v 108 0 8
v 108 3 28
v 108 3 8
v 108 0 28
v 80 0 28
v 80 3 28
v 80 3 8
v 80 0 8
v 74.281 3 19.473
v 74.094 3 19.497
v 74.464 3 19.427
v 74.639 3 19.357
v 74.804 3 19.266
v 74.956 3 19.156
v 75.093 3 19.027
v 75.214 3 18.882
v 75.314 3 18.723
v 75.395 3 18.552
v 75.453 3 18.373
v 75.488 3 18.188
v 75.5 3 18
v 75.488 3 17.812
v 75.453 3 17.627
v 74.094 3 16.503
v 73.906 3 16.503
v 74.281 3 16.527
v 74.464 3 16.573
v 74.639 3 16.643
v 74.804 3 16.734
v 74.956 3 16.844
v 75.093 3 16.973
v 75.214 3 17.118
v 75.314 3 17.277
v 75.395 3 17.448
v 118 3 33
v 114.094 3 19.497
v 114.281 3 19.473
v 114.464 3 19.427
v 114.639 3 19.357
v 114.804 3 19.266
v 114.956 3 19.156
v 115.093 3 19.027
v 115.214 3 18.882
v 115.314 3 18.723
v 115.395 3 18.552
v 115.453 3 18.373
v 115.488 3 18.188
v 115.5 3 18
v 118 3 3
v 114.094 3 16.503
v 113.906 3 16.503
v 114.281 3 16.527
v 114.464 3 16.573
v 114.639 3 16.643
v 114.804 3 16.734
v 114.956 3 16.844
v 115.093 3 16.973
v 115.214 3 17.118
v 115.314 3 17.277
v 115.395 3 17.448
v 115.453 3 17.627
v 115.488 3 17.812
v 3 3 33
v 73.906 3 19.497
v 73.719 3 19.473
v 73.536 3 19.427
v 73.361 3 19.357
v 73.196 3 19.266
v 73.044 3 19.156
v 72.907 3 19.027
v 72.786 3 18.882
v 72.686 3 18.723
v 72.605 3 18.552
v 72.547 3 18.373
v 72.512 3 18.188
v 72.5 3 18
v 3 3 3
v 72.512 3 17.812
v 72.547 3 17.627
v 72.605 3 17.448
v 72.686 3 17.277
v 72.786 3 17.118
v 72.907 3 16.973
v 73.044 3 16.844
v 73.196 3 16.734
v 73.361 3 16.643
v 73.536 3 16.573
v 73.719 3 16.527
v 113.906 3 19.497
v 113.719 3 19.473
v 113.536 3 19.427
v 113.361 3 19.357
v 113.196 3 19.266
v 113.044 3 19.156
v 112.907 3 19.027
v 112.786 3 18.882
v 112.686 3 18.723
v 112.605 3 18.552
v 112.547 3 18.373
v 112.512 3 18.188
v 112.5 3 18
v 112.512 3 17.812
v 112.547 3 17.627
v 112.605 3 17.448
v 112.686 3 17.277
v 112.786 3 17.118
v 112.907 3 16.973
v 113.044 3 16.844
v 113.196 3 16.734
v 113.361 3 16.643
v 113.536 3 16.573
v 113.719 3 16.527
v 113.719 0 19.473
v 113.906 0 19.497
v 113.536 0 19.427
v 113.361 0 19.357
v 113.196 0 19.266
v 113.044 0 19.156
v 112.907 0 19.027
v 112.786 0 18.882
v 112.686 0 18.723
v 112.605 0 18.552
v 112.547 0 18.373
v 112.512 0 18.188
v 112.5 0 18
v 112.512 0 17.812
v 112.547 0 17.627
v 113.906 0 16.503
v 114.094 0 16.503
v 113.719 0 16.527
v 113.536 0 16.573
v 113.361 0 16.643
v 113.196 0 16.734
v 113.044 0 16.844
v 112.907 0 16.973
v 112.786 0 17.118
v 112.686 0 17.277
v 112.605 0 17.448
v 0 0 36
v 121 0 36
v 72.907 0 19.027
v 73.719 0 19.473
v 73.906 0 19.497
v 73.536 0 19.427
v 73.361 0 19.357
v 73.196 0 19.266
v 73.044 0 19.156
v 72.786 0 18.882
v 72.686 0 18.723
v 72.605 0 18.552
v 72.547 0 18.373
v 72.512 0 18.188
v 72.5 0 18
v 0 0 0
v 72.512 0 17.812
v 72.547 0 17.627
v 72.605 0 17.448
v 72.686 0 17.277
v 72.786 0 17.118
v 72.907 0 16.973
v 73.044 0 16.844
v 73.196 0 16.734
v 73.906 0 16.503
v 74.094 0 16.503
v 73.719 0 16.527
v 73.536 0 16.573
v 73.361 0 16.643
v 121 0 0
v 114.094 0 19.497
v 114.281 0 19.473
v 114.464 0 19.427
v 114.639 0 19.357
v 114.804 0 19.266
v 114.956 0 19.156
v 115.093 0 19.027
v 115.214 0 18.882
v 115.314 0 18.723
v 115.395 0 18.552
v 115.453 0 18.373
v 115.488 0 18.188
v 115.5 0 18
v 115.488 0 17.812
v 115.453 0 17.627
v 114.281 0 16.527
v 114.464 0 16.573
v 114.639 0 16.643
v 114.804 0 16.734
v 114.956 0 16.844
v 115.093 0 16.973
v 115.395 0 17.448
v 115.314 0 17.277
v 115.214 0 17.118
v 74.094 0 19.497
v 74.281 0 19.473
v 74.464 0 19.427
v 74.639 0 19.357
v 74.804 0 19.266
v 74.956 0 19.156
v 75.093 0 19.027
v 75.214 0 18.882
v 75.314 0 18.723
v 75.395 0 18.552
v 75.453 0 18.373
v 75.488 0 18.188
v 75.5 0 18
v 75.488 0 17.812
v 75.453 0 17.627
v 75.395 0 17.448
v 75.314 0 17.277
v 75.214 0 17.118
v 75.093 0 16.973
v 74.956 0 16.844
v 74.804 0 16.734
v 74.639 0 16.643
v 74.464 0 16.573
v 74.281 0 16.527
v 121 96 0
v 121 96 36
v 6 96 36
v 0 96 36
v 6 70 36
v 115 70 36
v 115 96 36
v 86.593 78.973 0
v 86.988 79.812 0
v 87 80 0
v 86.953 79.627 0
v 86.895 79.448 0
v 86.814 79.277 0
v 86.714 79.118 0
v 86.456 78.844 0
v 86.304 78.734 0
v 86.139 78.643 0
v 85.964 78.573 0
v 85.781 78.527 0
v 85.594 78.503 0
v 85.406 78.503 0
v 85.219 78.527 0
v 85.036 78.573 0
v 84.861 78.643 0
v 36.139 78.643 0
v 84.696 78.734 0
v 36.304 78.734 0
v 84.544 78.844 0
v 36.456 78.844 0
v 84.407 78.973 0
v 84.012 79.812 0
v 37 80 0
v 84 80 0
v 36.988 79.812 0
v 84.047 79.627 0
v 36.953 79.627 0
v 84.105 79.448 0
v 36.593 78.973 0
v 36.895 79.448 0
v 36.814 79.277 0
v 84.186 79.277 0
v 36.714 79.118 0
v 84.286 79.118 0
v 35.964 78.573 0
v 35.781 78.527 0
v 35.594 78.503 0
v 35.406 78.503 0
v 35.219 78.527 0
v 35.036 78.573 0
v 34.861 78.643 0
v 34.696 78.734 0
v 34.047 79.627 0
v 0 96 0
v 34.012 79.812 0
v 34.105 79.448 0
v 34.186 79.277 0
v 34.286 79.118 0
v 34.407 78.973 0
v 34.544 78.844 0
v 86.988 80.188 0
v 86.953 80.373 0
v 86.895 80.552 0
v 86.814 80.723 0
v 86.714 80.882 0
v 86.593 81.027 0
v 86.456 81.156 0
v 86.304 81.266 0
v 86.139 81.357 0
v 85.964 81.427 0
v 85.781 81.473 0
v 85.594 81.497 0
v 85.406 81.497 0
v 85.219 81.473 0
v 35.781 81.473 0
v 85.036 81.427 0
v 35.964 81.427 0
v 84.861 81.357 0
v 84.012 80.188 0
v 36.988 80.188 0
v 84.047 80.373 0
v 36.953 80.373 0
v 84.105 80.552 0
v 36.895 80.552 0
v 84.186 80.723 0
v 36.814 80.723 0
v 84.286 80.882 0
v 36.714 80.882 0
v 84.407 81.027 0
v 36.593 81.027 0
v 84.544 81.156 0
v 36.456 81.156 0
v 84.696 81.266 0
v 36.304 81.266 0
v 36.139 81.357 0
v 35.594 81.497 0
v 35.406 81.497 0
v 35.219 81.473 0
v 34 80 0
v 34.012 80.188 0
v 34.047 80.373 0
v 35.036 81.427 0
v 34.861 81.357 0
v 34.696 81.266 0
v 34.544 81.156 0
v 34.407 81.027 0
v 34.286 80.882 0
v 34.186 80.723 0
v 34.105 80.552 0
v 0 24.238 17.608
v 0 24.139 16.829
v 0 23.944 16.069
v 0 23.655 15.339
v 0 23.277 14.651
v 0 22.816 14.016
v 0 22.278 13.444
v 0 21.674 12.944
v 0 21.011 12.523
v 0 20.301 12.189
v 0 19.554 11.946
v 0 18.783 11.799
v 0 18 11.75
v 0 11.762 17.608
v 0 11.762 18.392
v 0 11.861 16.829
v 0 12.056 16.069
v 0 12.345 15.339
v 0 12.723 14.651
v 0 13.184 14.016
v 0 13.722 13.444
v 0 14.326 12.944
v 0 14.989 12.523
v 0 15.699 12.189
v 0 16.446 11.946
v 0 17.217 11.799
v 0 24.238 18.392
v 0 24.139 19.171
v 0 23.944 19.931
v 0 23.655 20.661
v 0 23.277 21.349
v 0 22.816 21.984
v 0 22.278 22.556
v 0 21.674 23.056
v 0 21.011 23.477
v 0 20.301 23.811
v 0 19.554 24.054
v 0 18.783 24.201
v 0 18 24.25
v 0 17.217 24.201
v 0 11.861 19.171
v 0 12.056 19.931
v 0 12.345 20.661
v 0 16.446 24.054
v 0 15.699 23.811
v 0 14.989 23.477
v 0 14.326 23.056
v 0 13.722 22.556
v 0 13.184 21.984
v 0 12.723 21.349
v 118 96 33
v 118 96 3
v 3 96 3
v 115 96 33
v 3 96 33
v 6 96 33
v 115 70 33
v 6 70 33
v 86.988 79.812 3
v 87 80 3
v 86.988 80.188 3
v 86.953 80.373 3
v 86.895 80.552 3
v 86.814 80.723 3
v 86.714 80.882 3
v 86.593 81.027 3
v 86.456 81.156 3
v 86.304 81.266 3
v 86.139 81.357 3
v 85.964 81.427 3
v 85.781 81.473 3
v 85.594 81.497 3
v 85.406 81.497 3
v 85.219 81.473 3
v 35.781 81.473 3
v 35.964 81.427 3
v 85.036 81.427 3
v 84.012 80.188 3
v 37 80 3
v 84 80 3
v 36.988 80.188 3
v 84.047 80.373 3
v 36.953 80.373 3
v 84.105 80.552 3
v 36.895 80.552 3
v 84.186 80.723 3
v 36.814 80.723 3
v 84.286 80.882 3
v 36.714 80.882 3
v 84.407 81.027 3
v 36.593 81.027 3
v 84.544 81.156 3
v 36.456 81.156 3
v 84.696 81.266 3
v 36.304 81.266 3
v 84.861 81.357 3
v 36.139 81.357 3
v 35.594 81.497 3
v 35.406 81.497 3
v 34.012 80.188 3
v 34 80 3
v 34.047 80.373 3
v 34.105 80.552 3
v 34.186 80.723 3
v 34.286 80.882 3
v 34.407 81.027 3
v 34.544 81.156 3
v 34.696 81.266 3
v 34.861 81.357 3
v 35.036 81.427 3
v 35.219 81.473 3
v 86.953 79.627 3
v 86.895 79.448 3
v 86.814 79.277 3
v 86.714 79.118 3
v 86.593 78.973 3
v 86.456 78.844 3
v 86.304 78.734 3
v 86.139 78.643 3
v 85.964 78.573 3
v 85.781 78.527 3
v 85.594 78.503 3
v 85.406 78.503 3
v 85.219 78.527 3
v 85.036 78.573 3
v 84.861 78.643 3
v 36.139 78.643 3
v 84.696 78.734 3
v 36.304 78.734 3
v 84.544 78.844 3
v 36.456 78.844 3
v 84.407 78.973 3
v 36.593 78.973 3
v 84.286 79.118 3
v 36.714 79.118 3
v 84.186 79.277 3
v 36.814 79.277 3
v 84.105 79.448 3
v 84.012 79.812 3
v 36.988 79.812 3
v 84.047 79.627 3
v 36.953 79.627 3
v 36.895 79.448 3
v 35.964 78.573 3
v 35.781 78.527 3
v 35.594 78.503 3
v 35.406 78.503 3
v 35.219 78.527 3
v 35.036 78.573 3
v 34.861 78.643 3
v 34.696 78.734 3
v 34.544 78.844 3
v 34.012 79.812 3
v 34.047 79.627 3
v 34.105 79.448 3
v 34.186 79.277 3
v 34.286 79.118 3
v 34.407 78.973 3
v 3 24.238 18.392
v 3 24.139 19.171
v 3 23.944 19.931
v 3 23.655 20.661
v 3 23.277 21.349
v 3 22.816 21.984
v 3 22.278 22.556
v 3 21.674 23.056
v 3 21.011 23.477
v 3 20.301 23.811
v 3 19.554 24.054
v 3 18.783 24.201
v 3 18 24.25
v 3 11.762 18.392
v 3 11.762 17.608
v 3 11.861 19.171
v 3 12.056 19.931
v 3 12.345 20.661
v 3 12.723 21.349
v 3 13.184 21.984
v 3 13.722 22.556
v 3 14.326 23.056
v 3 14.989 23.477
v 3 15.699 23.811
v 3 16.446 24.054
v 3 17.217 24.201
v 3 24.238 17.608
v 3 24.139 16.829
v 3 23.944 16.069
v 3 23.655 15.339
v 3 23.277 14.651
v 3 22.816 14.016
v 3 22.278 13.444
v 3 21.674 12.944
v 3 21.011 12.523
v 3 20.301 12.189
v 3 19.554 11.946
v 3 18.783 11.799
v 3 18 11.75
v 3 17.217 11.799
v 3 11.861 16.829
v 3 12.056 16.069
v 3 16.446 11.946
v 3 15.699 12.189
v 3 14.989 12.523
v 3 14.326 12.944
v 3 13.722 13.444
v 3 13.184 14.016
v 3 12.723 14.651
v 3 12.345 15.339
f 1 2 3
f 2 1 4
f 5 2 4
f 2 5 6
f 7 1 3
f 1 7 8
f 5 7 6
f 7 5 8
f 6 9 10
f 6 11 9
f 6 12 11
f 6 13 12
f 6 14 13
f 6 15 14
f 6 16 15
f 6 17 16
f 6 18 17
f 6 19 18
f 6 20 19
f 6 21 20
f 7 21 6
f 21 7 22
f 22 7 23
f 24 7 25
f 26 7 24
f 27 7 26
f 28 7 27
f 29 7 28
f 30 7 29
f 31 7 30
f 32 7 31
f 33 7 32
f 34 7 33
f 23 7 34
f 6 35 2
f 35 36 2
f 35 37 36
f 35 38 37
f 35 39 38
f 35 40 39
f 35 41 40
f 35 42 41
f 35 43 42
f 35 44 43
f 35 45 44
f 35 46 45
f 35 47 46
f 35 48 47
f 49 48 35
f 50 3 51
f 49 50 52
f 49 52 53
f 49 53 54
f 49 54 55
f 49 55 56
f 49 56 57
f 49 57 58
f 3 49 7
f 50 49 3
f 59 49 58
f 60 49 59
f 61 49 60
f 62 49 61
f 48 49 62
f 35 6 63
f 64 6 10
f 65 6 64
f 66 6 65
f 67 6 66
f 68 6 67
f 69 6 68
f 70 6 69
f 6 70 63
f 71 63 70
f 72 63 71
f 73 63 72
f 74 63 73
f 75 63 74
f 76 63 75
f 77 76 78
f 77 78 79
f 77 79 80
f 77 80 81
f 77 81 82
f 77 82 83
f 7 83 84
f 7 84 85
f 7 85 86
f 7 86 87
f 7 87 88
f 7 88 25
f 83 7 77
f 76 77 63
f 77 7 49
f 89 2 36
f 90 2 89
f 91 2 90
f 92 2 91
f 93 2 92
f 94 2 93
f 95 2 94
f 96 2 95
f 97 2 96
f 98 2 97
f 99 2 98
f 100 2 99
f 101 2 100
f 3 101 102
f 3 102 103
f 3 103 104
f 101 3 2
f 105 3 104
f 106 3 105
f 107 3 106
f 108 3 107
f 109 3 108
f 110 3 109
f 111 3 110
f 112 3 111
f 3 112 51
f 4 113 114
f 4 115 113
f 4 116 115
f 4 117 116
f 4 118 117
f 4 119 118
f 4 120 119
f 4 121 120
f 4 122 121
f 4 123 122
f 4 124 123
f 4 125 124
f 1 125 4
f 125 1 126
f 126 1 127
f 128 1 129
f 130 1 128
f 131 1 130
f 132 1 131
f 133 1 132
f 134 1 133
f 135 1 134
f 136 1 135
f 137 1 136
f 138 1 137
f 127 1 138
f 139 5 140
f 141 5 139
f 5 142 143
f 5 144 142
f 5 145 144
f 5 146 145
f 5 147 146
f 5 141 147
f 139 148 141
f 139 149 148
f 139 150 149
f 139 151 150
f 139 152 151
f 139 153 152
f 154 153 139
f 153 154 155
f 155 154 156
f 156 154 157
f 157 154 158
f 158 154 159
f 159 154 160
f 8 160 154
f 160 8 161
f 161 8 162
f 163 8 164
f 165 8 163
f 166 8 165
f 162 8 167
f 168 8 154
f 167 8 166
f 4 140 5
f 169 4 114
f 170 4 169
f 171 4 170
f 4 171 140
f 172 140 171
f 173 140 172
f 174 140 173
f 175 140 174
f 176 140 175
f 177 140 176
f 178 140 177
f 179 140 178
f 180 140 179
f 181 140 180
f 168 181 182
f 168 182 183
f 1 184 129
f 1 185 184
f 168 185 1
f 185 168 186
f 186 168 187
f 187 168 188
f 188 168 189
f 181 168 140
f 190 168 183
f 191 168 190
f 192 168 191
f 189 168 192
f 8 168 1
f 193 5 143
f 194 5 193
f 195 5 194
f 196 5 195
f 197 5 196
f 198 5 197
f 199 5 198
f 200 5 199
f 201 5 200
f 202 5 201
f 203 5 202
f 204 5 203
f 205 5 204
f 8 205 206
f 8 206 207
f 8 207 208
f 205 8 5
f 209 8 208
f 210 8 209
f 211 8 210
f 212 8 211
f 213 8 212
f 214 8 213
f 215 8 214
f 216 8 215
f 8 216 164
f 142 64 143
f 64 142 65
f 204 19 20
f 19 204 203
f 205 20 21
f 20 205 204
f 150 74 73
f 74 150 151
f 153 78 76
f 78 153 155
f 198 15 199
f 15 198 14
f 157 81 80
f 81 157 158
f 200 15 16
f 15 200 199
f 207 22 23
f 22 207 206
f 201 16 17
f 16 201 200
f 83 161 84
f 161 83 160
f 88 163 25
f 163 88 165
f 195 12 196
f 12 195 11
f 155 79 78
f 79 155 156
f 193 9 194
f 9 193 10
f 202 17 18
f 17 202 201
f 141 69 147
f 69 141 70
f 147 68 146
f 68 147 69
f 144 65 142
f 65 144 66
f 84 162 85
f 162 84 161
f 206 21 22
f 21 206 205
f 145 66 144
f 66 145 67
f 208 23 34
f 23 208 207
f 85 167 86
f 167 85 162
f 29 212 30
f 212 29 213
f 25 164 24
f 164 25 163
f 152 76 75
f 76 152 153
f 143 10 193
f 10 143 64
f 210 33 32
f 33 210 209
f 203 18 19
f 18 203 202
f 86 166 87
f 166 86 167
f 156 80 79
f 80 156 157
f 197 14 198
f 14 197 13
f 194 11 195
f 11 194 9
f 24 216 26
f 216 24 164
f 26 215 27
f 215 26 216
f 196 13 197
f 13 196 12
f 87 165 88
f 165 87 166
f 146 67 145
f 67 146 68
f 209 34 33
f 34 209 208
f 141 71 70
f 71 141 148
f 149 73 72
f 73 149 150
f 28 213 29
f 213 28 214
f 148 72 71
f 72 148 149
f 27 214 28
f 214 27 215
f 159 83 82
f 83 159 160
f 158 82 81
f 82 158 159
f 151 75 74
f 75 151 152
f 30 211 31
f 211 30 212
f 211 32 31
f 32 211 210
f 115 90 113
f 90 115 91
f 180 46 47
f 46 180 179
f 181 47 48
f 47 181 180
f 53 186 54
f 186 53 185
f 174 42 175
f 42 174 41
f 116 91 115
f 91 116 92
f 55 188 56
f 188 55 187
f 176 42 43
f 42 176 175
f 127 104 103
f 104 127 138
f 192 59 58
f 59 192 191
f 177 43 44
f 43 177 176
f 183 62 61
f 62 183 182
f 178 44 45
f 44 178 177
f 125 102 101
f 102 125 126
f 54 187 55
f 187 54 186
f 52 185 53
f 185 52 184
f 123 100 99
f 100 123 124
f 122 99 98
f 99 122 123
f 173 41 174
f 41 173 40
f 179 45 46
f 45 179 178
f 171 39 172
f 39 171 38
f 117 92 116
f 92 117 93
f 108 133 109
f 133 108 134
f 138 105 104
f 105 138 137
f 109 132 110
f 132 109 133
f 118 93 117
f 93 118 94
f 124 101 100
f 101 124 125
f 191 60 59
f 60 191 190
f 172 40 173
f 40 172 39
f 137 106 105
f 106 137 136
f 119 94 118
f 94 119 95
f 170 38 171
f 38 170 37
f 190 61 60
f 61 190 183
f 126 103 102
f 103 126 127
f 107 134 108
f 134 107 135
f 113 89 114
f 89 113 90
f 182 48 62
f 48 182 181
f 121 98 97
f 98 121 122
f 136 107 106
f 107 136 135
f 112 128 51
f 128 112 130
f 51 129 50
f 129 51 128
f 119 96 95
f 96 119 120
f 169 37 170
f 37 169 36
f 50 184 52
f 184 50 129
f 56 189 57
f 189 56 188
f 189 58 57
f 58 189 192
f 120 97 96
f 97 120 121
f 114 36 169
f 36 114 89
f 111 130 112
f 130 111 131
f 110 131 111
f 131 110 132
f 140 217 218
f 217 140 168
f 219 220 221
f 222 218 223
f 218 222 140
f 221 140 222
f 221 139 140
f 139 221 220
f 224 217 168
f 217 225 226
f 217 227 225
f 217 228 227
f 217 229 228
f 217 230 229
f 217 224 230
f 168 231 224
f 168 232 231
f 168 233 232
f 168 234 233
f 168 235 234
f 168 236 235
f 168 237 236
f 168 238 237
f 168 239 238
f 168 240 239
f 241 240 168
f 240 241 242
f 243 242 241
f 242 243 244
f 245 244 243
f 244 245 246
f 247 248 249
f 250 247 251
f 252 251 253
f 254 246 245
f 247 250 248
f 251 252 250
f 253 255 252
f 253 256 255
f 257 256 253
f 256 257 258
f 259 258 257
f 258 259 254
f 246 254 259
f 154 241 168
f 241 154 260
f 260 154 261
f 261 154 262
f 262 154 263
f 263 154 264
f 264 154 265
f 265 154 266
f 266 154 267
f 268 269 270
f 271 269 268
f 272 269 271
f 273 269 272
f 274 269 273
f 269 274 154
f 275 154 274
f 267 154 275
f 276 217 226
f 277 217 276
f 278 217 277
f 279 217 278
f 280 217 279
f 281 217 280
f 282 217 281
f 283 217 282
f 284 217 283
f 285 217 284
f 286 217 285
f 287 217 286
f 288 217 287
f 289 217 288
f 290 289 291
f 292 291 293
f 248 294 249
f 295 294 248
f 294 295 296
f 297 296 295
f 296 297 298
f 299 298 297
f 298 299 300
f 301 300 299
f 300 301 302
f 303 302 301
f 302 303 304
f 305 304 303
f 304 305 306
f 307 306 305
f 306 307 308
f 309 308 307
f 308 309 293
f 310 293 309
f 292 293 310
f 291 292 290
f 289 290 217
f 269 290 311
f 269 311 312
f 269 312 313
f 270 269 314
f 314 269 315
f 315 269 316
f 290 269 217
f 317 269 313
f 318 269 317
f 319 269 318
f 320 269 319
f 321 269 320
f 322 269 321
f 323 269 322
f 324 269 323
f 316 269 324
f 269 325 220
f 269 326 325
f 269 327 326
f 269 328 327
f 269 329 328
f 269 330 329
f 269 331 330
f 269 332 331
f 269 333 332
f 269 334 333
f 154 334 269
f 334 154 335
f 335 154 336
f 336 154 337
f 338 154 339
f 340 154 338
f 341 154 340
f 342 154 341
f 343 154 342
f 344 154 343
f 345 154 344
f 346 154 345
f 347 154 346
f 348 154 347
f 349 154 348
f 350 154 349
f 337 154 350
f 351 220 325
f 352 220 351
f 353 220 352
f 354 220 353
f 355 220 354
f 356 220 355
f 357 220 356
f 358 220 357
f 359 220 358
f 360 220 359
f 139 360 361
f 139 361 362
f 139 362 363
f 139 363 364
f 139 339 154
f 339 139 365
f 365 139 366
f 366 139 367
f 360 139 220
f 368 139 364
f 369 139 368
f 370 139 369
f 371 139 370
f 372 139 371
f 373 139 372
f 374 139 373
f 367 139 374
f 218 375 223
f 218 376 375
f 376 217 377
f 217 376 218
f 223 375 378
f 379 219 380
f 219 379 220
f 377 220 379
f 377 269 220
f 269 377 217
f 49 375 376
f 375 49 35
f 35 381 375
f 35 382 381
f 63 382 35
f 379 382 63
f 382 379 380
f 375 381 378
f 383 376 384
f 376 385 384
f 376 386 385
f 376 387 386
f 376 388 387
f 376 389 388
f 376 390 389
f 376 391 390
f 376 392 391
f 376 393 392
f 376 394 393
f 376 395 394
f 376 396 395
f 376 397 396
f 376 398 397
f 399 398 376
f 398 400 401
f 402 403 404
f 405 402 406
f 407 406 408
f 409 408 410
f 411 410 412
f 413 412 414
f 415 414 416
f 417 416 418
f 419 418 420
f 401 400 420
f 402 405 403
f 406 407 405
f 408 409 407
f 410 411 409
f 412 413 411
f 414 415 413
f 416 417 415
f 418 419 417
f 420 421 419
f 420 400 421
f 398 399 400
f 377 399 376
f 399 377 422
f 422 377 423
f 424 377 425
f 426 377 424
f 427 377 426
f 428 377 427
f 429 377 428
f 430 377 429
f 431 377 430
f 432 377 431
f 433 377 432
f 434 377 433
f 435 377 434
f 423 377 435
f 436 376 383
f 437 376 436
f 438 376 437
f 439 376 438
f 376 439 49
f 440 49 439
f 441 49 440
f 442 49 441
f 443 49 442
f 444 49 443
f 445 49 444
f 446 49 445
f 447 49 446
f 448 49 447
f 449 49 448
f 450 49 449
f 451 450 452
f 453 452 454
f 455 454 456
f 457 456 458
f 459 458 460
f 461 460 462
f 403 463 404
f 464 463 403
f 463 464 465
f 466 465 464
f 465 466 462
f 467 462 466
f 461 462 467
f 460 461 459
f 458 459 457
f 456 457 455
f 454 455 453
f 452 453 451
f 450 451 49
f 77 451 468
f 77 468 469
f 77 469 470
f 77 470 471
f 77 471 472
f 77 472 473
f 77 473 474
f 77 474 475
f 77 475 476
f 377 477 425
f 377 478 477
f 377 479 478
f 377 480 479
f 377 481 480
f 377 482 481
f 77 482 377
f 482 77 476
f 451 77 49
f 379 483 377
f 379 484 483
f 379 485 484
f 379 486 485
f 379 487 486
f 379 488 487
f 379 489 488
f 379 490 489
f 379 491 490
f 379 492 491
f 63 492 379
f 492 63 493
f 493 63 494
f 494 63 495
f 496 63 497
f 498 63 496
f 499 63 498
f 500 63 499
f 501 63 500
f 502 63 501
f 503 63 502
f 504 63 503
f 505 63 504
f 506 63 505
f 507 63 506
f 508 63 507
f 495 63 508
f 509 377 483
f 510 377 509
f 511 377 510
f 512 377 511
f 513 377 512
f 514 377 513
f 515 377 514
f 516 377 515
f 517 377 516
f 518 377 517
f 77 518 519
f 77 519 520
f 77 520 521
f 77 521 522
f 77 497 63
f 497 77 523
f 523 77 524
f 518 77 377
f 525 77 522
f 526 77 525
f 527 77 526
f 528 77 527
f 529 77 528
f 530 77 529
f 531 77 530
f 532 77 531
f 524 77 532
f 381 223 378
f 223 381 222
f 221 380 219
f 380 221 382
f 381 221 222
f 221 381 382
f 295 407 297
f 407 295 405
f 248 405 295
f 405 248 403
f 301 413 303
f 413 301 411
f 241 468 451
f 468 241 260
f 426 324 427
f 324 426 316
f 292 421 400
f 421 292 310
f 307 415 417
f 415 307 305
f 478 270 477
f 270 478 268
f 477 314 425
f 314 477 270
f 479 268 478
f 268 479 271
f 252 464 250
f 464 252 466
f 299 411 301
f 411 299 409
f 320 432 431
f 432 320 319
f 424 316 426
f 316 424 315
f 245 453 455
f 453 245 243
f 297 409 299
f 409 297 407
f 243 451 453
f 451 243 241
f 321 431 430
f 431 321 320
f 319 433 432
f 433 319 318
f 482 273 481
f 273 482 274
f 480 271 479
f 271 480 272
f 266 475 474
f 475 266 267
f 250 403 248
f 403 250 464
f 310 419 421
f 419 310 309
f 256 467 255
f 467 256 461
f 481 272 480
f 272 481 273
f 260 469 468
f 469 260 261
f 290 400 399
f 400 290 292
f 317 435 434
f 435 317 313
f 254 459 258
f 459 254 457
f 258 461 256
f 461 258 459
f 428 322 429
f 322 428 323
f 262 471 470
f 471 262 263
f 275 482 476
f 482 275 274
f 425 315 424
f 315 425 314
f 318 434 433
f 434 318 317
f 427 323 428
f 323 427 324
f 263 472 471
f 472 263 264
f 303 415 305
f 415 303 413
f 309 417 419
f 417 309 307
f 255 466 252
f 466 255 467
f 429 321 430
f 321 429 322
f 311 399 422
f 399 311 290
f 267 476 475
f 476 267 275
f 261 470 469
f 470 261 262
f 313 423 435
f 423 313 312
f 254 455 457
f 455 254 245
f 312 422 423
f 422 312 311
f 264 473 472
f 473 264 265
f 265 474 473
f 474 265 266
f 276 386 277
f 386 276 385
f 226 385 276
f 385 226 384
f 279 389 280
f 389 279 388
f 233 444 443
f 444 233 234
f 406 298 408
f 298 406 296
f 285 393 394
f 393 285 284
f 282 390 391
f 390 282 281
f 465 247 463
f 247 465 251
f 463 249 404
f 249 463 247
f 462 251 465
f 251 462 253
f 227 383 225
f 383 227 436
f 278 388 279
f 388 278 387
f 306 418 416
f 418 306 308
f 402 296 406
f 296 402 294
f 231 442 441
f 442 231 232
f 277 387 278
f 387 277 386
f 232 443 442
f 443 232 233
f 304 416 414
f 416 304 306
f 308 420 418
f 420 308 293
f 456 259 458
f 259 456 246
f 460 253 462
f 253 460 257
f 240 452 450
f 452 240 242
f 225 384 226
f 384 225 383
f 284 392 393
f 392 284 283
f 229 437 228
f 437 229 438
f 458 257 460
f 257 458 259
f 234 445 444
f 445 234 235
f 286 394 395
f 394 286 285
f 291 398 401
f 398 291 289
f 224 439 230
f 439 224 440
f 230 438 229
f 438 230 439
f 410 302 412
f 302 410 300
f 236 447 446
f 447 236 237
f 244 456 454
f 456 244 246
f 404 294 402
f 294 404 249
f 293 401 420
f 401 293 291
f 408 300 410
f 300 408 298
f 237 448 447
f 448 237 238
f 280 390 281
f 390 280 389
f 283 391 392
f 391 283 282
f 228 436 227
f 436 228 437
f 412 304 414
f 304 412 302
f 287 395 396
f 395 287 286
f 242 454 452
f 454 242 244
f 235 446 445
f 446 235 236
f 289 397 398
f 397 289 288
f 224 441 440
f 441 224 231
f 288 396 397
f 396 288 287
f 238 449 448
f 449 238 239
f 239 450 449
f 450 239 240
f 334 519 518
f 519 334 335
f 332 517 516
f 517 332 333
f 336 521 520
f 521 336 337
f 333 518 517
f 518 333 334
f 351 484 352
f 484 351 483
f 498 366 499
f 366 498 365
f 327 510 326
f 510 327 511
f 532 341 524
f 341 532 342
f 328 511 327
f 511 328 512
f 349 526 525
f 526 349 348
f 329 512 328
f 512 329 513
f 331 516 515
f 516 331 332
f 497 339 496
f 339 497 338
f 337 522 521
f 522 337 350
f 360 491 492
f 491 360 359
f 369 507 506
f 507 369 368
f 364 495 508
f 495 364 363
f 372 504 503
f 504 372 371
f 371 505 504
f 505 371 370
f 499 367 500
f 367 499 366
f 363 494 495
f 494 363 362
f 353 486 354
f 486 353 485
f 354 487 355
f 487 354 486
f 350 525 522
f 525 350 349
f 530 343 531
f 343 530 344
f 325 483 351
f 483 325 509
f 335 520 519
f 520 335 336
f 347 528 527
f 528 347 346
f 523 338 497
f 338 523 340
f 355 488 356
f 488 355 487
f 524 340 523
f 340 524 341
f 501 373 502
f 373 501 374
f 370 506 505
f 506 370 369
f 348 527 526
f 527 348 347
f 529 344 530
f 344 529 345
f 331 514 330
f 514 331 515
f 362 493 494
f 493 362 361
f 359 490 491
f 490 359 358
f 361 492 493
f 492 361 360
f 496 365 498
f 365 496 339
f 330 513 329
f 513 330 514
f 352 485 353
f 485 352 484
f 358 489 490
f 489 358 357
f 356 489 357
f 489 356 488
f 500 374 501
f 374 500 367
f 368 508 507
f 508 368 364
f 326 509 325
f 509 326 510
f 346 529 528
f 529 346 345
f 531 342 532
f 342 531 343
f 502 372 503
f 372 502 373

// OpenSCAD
/**

PSU mounting and wiring cover
Meanwell LRS-200-24
@idnorton

Licenced as Creative Commons Attribution Non Commercial 3.0
See https://creativecommons.org/licenses/by-nc/3.0/

Specifically you may not sell the design or products using the design.
You're welcome to use the design to build things for your own use :)

**/

x = 115;
y = 90;
z = 30;
thickness = 3;
screws = 3;

iec_x = 28;
iec_y = thickness;
iec_z = 20;

difference() {
    // Outside box body
    cube([x+(2*thickness), y+(2*thickness), z+(2*thickness)]);

    // PSU body
    translate([thickness, thickness, thickness]) {
        cube([x, y*2, z]);
    }
    
    // Vent
    translate([6, 70, z]) {
        cube([x-6, 40, z]);
    }
    
    // Screw #1
    translate([32.5 + thickness, 80, 0]) {
        bottom_screw(2*thickness);
    }
    
    // Screw #2
    translate([x+(2*thickness) - (32.5 + thickness), 80, 0]) {
        bottom_screw(2*thickness);
    }

    // IEC cutout
    translate([80, 0, ((z+(2*thickness)-iec_z)/2)]) {
        iec_cutout();
    }
    
    // 24v fuse holder
    translate([0, (z+(2*thickness))/2, (z+(2*thickness))/2]) {
        rotate([0, 90, 0]) {
            cylinder(h=thickness*2, d=12.5, center=true, $fn=50);
        }
    }
    
    // Anderson connector
    anderson();
}

module anderson() {
    // 
}


module iec_cutout() {
    // IEC socket
    cube([28, thickness, 20]);
    
    iec_screws = 40;
    screw_offset = (iec_screws - iec_x)/2;
    
    // Screw #1
    translate([-screw_offset, 0, iec_z/2]) {
        front_screw(2*thickness);
    }
    
    // Screw #2
    translate([(iec_screws - screw_offset), 0, iec_z/2]) {
        front_screw(2*thickness);
    }
}


module bottom_screw(h) {
    rotate([0, 0, 0]) {
        cylinder(h=h, d=screws, center=true, $fn=50);
    }
}

module front_screw(h) {
    rotate([90, 0, 0]) {
        cylinder(h=h, d=screws, center=true, $fn=50);
    }
}
